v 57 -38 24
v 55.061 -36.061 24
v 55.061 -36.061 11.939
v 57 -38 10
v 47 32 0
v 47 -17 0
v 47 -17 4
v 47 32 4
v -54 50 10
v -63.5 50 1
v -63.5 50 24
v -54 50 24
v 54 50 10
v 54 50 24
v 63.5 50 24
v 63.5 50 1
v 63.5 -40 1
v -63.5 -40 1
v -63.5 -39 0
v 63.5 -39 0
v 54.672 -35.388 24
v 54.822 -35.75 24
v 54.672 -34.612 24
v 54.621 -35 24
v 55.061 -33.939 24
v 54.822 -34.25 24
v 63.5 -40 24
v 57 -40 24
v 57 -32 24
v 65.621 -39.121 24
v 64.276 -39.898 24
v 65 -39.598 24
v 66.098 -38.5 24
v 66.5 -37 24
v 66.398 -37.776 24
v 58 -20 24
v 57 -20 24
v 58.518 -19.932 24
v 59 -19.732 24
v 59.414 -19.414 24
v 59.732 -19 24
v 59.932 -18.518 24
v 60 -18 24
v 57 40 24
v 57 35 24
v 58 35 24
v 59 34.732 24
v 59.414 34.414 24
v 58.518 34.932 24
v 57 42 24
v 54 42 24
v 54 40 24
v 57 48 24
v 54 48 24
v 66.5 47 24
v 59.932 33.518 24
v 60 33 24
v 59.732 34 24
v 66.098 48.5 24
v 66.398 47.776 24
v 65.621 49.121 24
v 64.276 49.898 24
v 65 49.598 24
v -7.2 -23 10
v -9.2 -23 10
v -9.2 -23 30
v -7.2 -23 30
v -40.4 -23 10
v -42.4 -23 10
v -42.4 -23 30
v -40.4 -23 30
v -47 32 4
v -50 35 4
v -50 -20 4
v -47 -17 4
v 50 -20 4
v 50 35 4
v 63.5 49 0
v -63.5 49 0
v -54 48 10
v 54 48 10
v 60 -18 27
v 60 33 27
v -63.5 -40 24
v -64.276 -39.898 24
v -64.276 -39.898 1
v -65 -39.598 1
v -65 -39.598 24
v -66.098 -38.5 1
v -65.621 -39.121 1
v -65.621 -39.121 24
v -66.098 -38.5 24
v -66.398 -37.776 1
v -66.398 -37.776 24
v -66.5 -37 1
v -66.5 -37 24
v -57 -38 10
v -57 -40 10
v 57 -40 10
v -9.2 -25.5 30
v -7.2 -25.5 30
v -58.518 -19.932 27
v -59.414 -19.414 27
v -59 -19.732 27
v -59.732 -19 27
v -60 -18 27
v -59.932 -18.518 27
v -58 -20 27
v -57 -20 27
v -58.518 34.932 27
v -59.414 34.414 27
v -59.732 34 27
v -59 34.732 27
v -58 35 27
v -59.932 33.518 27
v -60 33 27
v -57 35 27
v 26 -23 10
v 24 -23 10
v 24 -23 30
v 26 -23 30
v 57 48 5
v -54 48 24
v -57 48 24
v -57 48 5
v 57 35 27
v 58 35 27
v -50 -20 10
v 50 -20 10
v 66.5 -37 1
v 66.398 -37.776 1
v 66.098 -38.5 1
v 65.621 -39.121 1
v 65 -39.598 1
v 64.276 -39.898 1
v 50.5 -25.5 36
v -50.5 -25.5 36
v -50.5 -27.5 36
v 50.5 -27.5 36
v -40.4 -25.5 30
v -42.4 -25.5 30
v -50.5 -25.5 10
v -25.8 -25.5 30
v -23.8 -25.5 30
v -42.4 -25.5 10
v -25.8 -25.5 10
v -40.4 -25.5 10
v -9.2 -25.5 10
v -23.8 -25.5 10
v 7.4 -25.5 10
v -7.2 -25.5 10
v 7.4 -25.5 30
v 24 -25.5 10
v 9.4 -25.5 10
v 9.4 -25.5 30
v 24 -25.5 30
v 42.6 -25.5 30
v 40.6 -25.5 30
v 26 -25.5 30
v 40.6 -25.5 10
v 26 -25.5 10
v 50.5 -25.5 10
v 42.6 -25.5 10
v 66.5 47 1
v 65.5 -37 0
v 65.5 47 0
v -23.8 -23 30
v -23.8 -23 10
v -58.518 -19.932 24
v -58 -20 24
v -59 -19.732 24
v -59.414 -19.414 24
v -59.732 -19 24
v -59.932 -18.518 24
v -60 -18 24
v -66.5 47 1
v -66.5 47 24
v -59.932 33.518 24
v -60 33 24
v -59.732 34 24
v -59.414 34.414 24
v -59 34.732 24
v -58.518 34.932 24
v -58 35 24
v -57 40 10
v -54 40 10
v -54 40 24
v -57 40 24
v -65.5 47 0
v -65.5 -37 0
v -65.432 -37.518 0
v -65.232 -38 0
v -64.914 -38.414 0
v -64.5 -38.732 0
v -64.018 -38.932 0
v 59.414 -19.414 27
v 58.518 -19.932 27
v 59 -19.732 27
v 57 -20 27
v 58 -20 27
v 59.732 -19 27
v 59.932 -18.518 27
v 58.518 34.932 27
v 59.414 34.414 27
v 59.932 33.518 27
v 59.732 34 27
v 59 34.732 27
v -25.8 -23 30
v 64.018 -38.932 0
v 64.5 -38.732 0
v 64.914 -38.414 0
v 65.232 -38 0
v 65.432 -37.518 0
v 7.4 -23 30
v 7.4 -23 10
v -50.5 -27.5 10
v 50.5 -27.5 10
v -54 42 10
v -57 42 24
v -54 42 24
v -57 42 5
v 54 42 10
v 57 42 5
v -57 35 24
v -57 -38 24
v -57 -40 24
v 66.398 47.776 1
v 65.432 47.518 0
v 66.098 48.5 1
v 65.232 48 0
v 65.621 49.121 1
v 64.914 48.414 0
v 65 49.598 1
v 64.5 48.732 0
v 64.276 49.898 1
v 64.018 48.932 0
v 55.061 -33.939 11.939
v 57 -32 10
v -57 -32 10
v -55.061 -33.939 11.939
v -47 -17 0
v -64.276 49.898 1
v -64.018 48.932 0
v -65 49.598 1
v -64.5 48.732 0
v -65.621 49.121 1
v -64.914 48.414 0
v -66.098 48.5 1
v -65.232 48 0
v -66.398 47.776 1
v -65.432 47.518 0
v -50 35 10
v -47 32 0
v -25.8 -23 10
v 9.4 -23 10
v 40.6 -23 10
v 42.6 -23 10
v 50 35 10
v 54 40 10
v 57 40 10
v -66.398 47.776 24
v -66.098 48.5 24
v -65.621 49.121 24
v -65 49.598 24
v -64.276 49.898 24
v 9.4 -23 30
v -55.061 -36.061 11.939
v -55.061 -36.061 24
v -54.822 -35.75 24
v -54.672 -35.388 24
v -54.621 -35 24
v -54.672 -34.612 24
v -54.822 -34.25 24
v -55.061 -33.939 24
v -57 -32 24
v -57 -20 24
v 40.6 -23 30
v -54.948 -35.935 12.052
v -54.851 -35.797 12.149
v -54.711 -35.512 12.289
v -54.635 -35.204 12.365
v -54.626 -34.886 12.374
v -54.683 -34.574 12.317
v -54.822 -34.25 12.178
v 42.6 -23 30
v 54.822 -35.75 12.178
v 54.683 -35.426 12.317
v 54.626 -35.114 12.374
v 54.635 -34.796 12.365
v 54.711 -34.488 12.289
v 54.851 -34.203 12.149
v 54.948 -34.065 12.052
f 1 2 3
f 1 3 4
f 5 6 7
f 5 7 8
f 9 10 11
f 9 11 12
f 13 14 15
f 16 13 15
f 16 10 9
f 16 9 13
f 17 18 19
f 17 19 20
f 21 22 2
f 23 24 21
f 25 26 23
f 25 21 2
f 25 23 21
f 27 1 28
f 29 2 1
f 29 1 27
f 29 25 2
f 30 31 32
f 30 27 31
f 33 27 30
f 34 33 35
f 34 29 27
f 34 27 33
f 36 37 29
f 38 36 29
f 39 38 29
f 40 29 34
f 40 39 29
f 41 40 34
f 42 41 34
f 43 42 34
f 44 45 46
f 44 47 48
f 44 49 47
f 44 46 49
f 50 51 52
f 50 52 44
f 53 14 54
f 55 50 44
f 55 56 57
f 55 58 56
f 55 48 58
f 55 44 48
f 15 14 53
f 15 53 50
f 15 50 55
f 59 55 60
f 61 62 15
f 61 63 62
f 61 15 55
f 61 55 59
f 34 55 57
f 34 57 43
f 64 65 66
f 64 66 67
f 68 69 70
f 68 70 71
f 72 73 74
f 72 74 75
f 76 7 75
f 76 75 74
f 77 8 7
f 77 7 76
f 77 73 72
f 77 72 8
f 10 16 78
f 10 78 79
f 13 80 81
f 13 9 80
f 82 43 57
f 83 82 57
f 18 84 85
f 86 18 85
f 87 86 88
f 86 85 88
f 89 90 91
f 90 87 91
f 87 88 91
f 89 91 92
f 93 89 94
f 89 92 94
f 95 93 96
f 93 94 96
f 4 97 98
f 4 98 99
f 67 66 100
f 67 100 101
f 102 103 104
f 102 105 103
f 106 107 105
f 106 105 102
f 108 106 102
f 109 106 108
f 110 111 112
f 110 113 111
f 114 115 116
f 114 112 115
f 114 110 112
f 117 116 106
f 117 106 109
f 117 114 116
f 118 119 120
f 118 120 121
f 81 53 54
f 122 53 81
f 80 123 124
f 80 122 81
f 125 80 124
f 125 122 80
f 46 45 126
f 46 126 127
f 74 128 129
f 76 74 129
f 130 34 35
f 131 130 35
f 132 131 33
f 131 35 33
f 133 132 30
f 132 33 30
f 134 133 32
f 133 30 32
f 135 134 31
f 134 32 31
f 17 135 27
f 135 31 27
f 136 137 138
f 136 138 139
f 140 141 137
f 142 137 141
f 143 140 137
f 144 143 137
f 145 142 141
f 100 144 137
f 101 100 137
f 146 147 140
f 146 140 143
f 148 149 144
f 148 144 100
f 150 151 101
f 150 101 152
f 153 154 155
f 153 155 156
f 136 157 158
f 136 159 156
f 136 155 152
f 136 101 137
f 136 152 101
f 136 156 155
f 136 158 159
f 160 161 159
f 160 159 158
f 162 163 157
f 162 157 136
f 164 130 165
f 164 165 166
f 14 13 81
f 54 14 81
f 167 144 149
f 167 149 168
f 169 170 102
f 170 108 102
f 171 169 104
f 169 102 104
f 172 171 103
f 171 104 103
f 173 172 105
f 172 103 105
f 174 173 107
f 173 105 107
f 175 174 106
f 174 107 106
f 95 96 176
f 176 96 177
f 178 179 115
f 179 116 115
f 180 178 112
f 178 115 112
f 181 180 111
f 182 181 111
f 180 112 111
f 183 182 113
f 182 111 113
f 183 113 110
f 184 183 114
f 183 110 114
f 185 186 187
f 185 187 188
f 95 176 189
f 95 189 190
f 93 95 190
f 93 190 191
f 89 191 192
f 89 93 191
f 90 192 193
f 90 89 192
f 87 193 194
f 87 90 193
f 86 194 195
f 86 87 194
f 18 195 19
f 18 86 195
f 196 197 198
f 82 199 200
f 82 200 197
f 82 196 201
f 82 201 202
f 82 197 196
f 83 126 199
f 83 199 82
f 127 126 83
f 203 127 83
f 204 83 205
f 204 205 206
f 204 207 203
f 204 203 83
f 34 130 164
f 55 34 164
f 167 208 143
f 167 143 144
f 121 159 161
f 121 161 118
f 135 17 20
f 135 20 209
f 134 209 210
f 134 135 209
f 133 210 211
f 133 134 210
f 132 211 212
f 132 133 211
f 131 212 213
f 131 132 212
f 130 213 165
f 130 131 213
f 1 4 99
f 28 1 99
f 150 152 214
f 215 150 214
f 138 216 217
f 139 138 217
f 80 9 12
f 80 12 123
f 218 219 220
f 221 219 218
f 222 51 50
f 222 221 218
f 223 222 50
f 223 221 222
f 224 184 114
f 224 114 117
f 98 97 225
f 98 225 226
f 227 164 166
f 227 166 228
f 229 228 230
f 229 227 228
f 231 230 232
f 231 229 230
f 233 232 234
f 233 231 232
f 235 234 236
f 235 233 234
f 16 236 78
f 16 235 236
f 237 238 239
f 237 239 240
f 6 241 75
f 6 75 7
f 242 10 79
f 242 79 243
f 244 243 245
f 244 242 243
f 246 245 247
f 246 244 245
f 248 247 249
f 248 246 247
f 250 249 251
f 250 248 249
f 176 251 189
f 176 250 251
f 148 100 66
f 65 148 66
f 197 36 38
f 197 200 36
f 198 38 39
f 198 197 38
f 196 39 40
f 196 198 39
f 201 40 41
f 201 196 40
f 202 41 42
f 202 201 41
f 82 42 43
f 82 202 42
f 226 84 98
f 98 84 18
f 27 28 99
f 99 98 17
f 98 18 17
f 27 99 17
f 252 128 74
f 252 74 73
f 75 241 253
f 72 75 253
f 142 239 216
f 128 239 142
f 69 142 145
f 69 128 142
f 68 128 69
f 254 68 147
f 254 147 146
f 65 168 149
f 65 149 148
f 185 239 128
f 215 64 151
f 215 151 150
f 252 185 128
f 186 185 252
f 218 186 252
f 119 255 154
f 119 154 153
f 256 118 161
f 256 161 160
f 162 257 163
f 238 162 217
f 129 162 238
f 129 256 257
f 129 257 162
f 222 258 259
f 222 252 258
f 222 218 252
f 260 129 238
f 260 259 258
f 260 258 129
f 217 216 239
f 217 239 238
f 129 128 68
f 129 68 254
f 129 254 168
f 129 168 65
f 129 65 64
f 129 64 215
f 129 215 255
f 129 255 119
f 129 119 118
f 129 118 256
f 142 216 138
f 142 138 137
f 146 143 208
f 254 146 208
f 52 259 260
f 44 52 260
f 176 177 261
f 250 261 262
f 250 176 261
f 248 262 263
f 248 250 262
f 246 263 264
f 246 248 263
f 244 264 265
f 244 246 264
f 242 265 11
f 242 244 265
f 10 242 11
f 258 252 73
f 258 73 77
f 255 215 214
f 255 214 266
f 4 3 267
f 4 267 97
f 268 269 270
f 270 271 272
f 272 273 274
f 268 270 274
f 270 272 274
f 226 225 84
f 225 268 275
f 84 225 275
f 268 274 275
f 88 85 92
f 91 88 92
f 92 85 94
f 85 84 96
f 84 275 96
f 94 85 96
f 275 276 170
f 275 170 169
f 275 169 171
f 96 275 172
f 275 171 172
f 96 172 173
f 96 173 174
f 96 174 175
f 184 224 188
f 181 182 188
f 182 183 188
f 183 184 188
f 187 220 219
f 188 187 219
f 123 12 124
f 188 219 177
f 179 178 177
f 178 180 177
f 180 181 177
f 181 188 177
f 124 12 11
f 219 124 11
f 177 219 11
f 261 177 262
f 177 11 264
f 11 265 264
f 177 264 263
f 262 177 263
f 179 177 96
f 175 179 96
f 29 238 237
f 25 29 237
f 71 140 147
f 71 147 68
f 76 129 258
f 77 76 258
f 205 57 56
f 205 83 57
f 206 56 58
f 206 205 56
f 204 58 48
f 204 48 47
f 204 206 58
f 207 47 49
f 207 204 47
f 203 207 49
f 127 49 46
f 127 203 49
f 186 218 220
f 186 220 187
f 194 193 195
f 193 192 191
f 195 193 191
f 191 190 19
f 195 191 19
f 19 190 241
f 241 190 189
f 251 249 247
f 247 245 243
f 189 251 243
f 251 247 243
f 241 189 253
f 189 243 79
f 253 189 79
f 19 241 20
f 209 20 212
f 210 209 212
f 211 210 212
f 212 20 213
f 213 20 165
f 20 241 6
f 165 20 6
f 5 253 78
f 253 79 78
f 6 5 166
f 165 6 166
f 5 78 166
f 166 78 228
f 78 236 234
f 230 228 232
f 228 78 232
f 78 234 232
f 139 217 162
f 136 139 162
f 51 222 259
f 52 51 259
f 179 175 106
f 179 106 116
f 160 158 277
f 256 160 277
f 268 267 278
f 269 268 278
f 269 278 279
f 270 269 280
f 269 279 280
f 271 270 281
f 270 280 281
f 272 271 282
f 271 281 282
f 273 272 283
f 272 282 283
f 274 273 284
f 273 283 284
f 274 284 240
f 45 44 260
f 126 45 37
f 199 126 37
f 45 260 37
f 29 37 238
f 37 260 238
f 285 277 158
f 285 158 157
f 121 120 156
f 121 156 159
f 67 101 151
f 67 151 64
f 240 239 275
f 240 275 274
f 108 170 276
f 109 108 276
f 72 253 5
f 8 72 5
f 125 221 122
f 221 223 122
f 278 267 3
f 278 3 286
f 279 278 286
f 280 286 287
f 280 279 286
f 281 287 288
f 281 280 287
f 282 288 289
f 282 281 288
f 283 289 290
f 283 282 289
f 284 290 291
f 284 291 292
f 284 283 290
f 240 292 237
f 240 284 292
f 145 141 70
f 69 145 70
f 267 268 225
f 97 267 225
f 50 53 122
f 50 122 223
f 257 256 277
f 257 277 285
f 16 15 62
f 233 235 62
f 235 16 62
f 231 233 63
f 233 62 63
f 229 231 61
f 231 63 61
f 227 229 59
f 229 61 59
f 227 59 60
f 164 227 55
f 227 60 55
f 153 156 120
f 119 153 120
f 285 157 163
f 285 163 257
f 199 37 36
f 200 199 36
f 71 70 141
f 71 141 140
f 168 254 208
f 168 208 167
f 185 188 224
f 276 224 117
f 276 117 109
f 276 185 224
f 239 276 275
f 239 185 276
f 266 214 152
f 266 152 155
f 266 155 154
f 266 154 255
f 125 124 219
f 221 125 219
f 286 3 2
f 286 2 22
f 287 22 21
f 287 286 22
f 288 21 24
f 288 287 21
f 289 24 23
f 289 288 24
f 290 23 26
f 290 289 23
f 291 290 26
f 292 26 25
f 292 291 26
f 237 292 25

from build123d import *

# Parameters (mm, degrees)
SKETCH_W             = 133
SKETCH_H             = 90
PAD_DEPTH            = 10
PAD001_DEPTH         = 24
PAD002_DEPTH         = 133
SKETCH003_W          = 101
SKETCH003_H          = 2
PAD003_DEPTH         = 36
SKETCH004_W          = 2
SKETCH004_H          = 3
PAD004_DEPTH         = 30
LINEARPATTERN_COUNT  = 6
LINEARPATTERN_PITCH  = 16.6
SKETCH005_W          = 100
SKETCH005_H          = 55
POCKET_DEPTH         = 6
SKETCH006_W          = 94
SKETCH006_H          = 49
POCKET001_DEPTH      = 36.001
SKETCH007_W          = 6
SKETCH007_H          = 6
POCKET002_DEPTH      = 57
POCKET002_DEPTH_BACK = -57
FILLET_R             = 3
FILLET001_R          = 3
CHAMFER_SIZE         = 1
SKETCH008_W          = 3
SKETCH008_H          = 55
PAD005_DEPTH         = 3
FILLET002_R          = 2
FILLET003_R          = 2


with BuildPart() as part:
    # Sketch → Pad (new body)
    with BuildSketch(Plane.XY):
        with Locations((0, 5)):
            Rectangle(SKETCH_W, SKETCH_H)
    extrude(amount=PAD_DEPTH)

    # Sketch001 → Pad001 (join)
    with BuildSketch(Plane.XY):
        with BuildLine():
            Line((-66.5, -40), (-66.5, 50))
            Line((-66.5, 50), (-54, 50))
            Line((-54, 50), (-54, 48))
            Line((-54, 48), (-57, 48))
            Line((-57, 48), (-57, 42))
            Line((-57, 42), (-54, 42))
            Line((-54, 42), (-54, 40))
            Line((-54, 40), (-57, 40))
            Line((-57, 40), (-57, -32))
            Line((-57, -32), (-55.06066, -33.93934))
            ThreePointArc((-55.06066, -36.06066), (-54.62132, -35), (-55.06066, -33.93934))
            Line((-55.06066, -36.06066), (-57, -38))
            Line((-57, -38), (-57, -40))
            Line((-57, -40), (-66.5, -40))
        make_face()
    pad001 = extrude(amount=PAD001_DEPTH)

    # Mirrored: Pad001 across Sketch001 V_Axis
    add(pad001.mirror(Plane(origin=(0, 0, 0), x_dir=(0, 0, 1), z_dir=(1, 0, 0))))

    # Sketch002 (on Face10 of Mirrored) → Pad002 (join)
    with BuildSketch(Plane(origin=(-66.5, 0, 0), x_dir=(0, -1, 0), z_dir=(-1, 0, 0))):
        with BuildLine():
            Line((32, 10), (33.93934, 11.93934))
            ThreePointArc((36.06066, 11.93934), (35, 12.37868), (33.93934, 11.93934))
            Line((36.06066, 11.93934), (38, 10))
            Line((38, 10), (32, 10))
        make_face()
    extrude(amount=-PAD002_DEPTH)

    # Sketch003 → Pad003 (join)
    with BuildSketch(Plane.XY):
        with Locations((0, -26.5)):
            Rectangle(SKETCH003_W, SKETCH003_H)
    extrude(amount=PAD003_DEPTH)

    # Sketch004 → Pad004 (join)
    with BuildSketch(Plane.XY):
        with Locations((41.6, -24.5)):
            Rectangle(SKETCH004_W, SKETCH004_H)
    pad004 = extrude(amount=PAD004_DEPTH)

    # LinearPattern: Pad004 ×6
    with Locations(*[(-i * LINEARPATTERN_PITCH, 0, 0) for i in range(1, LINEARPATTERN_COUNT)]):
        add(pad004)

    # Sketch005 (on Face38 of LinearPattern) → Pocket (cut)
    with BuildSketch(Plane.XY.offset(10)):
        with Locations((0, 7.5)):
            Rectangle(SKETCH005_W, SKETCH005_H)
    extrude(amount=-POCKET_DEPTH, mode=Mode.SUBTRACT)

    # Sketch006 → Pocket001 (cut, through all)
    with BuildSketch(Plane.XY):
        with Locations((0, 7.5)):
            Rectangle(SKETCH006_W, SKETCH006_H)
    extrude(amount=POCKET001_DEPTH, mode=Mode.SUBTRACT)

    # Sketch007 → Pocket002 (cut, two sides)
    with BuildSketch(Plane.YZ) as pocket002_sk:
        with Locations((45, 8)):
            Rectangle(SKETCH007_W, SKETCH007_H)
    extrude(amount=-POCKET002_DEPTH, mode=Mode.SUBTRACT)
    extrude(pocket002_sk.sketch, amount=-POCKET002_DEPTH_BACK, mode=Mode.SUBTRACT)

    # Fillet
    fillet_edges = [part.edges().sort_by_distance(p)[0] for p in [
        (-66.5, -40, 17),
        (-66.5, -40, 5),
        (-66.5, 50, 17),
        (-66.5, 50, 5),
    ]]
    fillet(fillet_edges, radius=FILLET_R)

    # Fillet001
    fillet001_edges = [part.edges().sort_by_distance(p)[0] for p in [
        (66.5, 50, 17),
        (66.5, 50, 5),
        (66.5, -40, 17),
        (66.5, -40, 5),
    ]]
    fillet(fillet001_edges, radius=FILLET001_R)

    # Chamfer
    chamfer_edges = [part.edges().sort_by_distance(p)[0] for p in [
        (66.5, 5, 0),
        (65.62132, 49.12132, 0),
        (58.75, 50, 0),
        (0, 50, 0),
        (-58.75, 50, 0),
        (-65.62132, 49.12132, 0),
        (-66.5, 5, 0),
        (-65.62132, -39.12132, 0),
        (-60.25, -40, 0),
        (0, -40, 0),
        (60.25, -40, 0),
        (65.62132, -39.12132, 0),
    ]]
    chamfer(chamfer_edges, length=CHAMFER_SIZE)

    # Sketch008 (on Face13 of Chamfer) → Pad005 (join)
    with BuildSketch(Plane.XY.offset(24)):
        with Locations((58.5, 7.5)):
            Rectangle(SKETCH008_W, SKETCH008_H)
        with Locations((-58.5, 7.5)):
            Rectangle(SKETCH008_W, SKETCH008_H)
    extrude(amount=PAD005_DEPTH)

    # Fillet002
    fillet002_edges = [part.edges().sort_by_distance(p)[0] for p in [
        (60, -20, 25.5),
        (60, 35, 25.5),
    ]]
    fillet(fillet002_edges, radius=FILLET002_R)

    # Fillet003
    fillet003_edges = [part.edges().sort_by_distance(p)[0] for p in [
        (-60, -20, 25.5),
        (-60, 35, 25.5),
    ]]
    fillet(fillet003_edges, radius=FILLET003_R)


solid = part.part
